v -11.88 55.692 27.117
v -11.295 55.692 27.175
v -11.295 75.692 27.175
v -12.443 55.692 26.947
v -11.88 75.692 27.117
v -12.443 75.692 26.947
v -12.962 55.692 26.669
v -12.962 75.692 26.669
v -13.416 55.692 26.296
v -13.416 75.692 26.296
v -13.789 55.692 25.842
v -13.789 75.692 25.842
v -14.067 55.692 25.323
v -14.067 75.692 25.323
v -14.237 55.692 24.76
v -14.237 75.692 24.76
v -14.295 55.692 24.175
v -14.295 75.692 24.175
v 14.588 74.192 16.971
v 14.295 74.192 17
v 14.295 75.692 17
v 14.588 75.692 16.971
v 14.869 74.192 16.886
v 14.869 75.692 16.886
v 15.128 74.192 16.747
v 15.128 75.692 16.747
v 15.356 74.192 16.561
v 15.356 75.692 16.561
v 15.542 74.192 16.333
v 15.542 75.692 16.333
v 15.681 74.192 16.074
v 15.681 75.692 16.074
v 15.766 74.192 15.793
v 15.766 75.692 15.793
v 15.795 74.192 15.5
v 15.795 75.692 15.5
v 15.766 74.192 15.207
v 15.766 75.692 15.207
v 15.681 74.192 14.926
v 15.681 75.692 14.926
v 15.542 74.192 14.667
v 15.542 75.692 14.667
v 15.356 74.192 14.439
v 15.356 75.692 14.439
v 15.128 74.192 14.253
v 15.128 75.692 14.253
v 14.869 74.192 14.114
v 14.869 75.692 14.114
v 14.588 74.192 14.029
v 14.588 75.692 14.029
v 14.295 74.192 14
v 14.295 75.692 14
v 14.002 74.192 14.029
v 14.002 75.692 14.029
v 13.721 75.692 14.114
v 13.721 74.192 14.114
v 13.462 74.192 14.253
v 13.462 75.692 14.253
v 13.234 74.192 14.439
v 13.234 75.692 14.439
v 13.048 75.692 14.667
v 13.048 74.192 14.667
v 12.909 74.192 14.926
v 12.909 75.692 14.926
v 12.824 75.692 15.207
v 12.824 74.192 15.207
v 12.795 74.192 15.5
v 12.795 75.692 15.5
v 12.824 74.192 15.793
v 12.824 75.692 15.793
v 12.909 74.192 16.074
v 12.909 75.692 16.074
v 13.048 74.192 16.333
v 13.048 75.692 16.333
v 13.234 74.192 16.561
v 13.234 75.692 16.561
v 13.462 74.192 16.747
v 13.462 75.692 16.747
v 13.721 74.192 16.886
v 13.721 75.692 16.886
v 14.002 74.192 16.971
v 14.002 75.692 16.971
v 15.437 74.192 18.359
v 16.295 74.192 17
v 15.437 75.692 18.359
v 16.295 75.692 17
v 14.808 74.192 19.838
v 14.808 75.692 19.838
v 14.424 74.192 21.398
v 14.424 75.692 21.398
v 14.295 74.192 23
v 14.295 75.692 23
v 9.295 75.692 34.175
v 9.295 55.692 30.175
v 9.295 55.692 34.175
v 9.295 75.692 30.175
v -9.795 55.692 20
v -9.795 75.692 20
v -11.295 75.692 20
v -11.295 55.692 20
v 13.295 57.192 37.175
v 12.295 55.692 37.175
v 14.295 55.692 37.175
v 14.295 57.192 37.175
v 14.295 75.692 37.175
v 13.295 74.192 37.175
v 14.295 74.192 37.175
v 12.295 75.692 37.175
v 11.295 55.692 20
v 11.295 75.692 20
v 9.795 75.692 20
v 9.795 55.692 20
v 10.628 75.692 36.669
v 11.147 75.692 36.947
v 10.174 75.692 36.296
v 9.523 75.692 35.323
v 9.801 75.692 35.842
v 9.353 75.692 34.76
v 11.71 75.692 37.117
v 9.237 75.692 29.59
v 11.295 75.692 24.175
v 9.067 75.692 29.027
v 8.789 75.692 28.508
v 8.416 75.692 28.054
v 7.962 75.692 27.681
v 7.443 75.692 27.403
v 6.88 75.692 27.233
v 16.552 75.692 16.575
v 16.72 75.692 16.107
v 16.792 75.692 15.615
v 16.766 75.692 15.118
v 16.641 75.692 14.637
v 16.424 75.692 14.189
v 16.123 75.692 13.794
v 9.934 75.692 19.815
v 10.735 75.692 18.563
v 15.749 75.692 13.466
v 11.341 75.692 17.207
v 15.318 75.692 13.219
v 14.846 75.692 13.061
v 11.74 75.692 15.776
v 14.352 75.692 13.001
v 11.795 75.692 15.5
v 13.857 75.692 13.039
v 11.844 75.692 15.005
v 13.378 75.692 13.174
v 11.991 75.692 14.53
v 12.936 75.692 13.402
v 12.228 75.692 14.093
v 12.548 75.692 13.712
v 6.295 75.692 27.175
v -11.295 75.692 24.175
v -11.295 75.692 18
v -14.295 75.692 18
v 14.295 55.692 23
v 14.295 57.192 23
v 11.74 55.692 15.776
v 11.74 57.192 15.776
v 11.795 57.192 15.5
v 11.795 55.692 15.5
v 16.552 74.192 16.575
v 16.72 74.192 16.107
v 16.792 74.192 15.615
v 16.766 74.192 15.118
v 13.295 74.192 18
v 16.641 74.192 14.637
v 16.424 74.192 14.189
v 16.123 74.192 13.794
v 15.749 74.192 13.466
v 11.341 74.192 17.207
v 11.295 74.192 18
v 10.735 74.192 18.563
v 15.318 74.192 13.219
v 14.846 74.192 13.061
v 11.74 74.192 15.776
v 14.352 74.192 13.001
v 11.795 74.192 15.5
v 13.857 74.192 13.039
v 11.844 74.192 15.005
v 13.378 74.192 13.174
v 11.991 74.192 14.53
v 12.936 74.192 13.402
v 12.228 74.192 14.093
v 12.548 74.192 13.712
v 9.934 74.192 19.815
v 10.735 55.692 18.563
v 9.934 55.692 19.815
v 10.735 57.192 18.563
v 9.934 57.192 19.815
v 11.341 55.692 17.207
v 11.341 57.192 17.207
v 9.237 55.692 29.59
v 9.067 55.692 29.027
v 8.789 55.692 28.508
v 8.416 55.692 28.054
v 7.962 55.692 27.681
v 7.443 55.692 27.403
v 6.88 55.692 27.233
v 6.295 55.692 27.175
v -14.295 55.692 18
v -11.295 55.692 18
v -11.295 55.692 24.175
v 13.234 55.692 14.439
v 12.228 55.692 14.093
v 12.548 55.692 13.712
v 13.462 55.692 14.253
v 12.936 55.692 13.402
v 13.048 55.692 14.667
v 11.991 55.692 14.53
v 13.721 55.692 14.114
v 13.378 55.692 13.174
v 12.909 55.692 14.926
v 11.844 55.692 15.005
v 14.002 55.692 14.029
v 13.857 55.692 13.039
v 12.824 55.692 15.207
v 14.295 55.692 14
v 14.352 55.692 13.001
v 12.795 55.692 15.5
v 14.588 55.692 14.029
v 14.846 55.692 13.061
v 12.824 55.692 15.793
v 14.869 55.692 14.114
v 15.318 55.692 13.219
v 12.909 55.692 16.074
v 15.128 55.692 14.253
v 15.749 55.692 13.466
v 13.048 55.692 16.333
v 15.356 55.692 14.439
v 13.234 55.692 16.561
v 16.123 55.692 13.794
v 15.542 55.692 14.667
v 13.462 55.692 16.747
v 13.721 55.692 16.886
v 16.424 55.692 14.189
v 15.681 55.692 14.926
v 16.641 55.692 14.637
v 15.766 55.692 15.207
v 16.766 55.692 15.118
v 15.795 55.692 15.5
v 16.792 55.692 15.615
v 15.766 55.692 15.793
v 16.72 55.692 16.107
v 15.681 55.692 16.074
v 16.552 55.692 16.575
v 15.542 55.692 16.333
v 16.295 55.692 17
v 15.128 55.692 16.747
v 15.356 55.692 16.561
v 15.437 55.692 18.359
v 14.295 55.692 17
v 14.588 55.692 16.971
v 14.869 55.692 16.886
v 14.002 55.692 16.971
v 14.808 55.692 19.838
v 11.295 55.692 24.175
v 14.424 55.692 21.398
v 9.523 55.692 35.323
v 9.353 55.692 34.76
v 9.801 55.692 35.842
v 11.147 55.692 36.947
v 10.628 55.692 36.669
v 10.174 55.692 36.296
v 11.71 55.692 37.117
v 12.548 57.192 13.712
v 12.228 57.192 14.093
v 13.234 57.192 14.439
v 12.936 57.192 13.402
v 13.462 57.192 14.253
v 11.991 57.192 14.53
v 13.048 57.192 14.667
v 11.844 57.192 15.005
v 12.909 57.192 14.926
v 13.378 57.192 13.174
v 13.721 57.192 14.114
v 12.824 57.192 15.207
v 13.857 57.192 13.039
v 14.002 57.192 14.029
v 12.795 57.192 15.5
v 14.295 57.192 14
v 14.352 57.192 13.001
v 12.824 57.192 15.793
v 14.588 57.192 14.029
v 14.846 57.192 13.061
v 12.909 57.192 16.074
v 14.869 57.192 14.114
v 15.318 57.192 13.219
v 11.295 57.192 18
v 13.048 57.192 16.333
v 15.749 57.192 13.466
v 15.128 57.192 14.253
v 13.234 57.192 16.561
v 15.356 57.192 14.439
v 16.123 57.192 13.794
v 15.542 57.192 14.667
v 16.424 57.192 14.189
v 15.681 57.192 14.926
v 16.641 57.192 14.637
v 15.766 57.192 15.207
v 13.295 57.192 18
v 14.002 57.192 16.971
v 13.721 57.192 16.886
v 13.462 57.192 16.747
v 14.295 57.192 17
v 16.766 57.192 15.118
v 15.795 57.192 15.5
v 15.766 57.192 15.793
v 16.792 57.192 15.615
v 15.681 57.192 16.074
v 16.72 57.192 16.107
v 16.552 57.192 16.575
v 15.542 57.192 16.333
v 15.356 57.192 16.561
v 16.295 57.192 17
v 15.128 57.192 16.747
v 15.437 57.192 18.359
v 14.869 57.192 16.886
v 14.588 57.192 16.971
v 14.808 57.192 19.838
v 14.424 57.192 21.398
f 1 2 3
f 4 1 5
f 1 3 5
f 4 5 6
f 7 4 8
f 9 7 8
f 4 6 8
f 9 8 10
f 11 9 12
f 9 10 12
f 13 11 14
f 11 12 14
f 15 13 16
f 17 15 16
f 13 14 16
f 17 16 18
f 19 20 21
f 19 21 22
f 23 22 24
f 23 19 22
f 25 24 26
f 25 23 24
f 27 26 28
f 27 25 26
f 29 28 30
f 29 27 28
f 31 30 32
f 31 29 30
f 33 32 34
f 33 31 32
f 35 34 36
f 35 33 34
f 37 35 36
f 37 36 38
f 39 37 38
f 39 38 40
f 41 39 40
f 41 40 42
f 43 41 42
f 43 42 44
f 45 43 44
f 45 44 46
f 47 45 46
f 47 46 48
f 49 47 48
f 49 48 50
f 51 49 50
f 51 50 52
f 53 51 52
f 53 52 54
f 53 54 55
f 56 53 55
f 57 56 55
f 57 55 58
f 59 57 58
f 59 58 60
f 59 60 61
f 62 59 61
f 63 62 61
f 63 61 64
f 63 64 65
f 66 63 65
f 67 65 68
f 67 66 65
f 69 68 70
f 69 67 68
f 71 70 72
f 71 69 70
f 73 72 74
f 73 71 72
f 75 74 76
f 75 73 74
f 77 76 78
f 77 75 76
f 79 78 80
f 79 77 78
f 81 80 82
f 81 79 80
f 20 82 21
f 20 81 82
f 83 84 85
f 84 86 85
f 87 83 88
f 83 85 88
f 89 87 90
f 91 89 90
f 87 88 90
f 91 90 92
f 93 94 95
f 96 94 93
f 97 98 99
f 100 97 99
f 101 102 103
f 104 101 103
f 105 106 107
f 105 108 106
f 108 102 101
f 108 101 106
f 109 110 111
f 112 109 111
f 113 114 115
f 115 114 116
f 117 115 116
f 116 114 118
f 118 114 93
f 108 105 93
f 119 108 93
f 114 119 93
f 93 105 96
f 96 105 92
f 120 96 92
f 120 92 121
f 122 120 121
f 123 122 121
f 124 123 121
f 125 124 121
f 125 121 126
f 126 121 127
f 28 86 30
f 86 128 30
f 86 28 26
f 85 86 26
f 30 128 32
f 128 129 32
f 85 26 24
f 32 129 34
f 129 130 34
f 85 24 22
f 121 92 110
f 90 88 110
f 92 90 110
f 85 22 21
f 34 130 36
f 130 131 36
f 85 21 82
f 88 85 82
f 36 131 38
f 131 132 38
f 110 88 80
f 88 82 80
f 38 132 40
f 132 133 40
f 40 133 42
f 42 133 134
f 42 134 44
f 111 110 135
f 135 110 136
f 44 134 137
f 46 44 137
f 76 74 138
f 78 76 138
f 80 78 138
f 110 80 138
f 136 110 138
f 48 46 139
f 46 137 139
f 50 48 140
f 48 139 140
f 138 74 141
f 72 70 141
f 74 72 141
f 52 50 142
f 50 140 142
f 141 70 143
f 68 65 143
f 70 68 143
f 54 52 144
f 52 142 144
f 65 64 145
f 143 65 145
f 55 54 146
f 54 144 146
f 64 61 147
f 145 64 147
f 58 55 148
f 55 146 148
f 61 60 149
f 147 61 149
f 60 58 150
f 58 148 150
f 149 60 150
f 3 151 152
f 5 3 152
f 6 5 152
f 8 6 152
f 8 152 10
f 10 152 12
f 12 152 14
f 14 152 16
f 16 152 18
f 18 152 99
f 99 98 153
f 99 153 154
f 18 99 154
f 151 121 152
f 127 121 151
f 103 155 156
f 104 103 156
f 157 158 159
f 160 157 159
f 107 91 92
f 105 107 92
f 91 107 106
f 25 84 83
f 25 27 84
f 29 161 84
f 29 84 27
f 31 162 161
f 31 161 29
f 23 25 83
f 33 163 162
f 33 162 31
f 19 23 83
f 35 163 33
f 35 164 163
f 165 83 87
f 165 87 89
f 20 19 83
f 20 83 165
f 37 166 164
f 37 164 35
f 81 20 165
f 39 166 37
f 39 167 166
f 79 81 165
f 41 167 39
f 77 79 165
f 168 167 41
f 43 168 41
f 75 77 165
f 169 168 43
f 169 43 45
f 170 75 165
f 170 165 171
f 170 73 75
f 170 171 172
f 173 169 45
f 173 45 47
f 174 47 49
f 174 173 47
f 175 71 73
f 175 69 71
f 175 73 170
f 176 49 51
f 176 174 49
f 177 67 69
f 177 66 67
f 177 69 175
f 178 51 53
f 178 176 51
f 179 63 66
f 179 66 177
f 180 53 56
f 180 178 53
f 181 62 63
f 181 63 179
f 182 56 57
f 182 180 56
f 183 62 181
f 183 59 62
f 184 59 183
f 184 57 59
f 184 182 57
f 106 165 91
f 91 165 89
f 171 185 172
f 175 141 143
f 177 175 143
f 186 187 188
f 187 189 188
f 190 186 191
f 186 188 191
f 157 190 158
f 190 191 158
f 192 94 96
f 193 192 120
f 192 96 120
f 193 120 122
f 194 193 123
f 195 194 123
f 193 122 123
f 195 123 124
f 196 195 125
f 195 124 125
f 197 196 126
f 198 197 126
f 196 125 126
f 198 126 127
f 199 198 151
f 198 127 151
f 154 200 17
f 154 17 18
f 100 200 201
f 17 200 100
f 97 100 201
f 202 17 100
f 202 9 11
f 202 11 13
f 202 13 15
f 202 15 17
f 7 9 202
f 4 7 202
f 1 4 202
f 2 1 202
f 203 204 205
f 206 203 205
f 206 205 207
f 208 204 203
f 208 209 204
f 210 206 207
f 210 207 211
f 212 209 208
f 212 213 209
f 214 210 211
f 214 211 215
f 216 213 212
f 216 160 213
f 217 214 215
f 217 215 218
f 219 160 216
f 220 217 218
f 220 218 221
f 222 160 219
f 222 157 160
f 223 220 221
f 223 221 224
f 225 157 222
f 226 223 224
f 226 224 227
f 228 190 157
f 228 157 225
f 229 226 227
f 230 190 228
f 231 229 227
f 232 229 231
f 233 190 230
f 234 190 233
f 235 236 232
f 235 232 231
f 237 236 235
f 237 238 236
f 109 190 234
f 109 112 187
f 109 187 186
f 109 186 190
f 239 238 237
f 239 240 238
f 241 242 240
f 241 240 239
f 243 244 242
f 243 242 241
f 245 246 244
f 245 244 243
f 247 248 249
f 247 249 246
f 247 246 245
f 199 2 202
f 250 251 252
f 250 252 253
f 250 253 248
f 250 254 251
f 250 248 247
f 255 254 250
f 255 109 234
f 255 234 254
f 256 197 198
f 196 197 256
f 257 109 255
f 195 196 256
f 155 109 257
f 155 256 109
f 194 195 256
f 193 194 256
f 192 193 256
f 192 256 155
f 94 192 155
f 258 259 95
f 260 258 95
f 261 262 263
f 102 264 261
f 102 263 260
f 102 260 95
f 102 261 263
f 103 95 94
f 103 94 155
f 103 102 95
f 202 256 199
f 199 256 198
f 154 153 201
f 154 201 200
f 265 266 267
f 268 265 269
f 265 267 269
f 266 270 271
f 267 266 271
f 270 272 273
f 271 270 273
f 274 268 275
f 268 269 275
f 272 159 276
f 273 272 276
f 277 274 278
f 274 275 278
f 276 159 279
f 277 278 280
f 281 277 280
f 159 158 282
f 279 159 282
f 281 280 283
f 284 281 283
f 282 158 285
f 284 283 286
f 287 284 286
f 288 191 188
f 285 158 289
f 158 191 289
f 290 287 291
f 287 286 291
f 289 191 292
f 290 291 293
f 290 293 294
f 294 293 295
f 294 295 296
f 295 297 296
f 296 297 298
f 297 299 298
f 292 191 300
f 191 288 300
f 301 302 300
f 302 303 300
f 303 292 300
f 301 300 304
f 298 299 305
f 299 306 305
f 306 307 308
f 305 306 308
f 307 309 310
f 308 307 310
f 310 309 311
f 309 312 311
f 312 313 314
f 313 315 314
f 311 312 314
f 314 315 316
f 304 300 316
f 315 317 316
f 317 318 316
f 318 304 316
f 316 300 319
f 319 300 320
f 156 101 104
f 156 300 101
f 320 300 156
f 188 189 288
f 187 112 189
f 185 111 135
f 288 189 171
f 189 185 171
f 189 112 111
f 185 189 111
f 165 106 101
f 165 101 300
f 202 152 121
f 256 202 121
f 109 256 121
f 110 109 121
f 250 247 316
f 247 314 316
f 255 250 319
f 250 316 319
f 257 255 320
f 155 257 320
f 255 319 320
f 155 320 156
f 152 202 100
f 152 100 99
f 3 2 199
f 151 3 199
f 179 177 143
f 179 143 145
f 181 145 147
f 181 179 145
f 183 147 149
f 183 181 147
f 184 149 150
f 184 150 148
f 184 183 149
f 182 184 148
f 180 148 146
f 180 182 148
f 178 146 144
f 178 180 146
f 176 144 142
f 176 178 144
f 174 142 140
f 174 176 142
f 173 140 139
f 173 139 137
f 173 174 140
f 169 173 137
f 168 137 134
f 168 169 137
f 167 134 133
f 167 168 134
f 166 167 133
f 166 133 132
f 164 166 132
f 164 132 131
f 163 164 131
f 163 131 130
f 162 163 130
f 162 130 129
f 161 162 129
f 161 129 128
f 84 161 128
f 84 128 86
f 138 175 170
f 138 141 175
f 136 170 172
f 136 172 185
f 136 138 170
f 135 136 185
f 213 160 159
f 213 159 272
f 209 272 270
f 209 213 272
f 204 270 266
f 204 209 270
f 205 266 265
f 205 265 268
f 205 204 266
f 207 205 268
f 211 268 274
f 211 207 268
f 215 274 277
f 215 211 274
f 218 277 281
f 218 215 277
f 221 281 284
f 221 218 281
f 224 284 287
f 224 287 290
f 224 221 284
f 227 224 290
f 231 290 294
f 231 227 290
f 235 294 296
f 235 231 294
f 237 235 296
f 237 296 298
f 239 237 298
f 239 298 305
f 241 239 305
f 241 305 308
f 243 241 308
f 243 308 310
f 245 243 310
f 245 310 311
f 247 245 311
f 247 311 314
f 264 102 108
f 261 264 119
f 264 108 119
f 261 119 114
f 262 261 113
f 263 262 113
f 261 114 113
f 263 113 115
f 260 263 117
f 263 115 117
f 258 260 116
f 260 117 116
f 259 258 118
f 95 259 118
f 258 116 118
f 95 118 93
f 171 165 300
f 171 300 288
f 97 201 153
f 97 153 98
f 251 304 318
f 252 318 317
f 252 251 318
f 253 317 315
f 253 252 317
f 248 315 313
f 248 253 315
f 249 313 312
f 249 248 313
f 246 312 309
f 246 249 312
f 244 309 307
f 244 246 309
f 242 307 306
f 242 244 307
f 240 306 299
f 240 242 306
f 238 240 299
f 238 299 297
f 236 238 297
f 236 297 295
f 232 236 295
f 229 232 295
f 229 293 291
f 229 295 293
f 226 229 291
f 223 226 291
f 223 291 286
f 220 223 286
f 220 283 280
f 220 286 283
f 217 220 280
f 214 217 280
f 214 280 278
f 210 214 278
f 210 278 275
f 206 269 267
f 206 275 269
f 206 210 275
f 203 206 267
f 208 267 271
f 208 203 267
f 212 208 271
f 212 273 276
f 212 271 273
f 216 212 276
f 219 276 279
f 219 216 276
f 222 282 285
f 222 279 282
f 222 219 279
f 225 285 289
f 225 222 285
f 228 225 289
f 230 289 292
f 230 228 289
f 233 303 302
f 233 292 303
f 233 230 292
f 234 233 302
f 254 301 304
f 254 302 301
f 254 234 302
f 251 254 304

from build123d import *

# Parameters (mm, degrees)
SKETCH1_W           = 28.59
SKETCH1_H           = 20
BOSS_EXTRUDE1_DEPTH = 3
SKETCH2_W           = 3
SKETCH2_H           = 20
BOSS_EXTRUDE2_DEPTH = 6.175
BOSS_EXTRUDE3_DEPTH = 20
SKETCH5_W           = 5
SKETCH5_H           = 20
BOSS_EXTRUDE4_DEPTH = 10
BOSS_EXTRUDE5_DEPTH = 1.5
BOSS_EXTRUDE6_START = -1.5
BOSS_EXTRUDE6_DEPTH = 1.5
CUT_EXTRUDE1_START  = -20
SKETCH8_R           = 1.5
CUT_EXTRUDE1_DEPTH  = 20
SKETCH9_W           = 19.175
SKETCH9_H           = 17
CUT_EXTRUDE2_DEPTH  = 1
FILLET1_R           = 10
FILLET2_R           = 10
FILLET3_R           = 3


with BuildPart() as part:
    # Sketch1 → Boss-Extrude1 (new body)
    with BuildSketch(Plane.XY.offset(24.175)):
        with Locations((0, 65.691967044)):
            Rectangle(SKETCH1_W, SKETCH1_H)
    extrude(amount=BOSS_EXTRUDE1_DEPTH)

    # Sketch2 → Boss-Extrude2 (add)
    with BuildSketch(Plane(origin=(0, 0, 24.175), x_dir=(-1, 0, 0), z_dir=(0, 0, -1))):
        with Locations((-12.795, 65.691967044)):
            Rectangle(SKETCH2_W, SKETCH2_H)
        with Locations((12.795, 65.691967044)):
            Rectangle(SKETCH2_W, SKETCH2_H)
    extrude(amount=BOSS_EXTRUDE2_DEPTH)

    # Sketch4 → Boss-Extrude3 (add)
    with BuildSketch(Plane(origin=(0, 75.691967044, 0), x_dir=(1, 0, 0), z_dir=(0, 1, 0))):
        Polygon((-11.295, -20), (-11.295, -18), (-9.795, -20), align=None)
        Polygon((11.295, -18), (11.295, -20), (9.795, -20), align=None)
    extrude(amount=-BOSS_EXTRUDE3_DEPTH)

    # Sketch5 → Boss-Extrude4 (add)
    with BuildSketch(Plane.XY.offset(27.175)):
        with Locations((11.795, 65.691967044)):
            Rectangle(SKETCH5_W, SKETCH5_H)
    extrude(amount=BOSS_EXTRUDE4_DEPTH)

    # Sketch6 → Boss-Extrude5 (add)
    with BuildSketch(Plane.XZ.offset(-55.691967044)):
        with BuildLine():
            Line((11.295, 18), (11.795, 15.5))
            ThreePointArc((11.795, 15.5), (16.062766953, 13.732233047), (14.295, 18))
            Line((14.295, 18), (11.295, 18))
        make_face()
    extrude(amount=-BOSS_EXTRUDE5_DEPTH)

    # Sketch7 → Boss-Extrude6 (add)
    with BuildSketch(Plane(origin=(0, 75.691967044, 0), x_dir=(1, 0, 0), z_dir=(0, 1, 0)).offset(BOSS_EXTRUDE6_START)):
        with BuildLine():
            Line((11.295, -18), (11.795, -15.5))
            ThreePointArc((11.795, -15.5), (16.062766953, -13.732233047), (14.295, -18))
            Line((14.295, -18), (11.295, -18))
        make_face()
    extrude(amount=BOSS_EXTRUDE6_DEPTH)

    # Sketch8 → Cut-Extrude1 (cut)
    with BuildSketch(Plane(origin=(0, 75.691967044, 0), x_dir=(1, 0, 0), z_dir=(0, 1, 0)).offset(CUT_EXTRUDE1_START)):
        with Locations(Location((14.295, -15.5, 0), (0, 0, 270))):
            Circle(SKETCH8_R)
    extrude(amount=CUT_EXTRUDE1_DEPTH, mode=Mode.SUBTRACT)

    # Sketch9 → Cut-Extrude2 (cut)
    with BuildSketch(Plane(origin=(14.295, 0, 0), x_dir=(0, 0, -1), z_dir=(1, 0, 0))):
        with Locations((-27.5875, 65.691967044)):
            Rectangle(SKETCH9_W, SKETCH9_H)
    extrude(amount=-CUT_EXTRUDE2_DEPTH, mode=Mode.SUBTRACT)

    # Fillet1
    fillet1_edges = [part.edges().sort_by_distance(p)[0] for p in [
        (14.295, 74.941967044, 18),
        (14.295, 56.441967044, 18),
    ]]
    fillet(fillet1_edges, radius=FILLET1_R)

    # Fillet2
    fillet2_edges = [part.edges().sort_by_distance(p)[0] for p in [
        (11.295, 74.941967044, 18),
        (11.295, 56.441967044, 18),
    ]]
    fillet(fillet2_edges, radius=FILLET2_R)

    # Fillet3
    fillet3_edges = [part.edges().sort_by_distance(p)[0] for p in [
        (-14.295, 65.691967044, 27.175),
        (9.295, 65.691967044, 27.175),
        (9.295, 65.691967044, 37.175),
    ]]
    fillet(fillet3_edges, radius=FILLET3_R)


solid = part.part
